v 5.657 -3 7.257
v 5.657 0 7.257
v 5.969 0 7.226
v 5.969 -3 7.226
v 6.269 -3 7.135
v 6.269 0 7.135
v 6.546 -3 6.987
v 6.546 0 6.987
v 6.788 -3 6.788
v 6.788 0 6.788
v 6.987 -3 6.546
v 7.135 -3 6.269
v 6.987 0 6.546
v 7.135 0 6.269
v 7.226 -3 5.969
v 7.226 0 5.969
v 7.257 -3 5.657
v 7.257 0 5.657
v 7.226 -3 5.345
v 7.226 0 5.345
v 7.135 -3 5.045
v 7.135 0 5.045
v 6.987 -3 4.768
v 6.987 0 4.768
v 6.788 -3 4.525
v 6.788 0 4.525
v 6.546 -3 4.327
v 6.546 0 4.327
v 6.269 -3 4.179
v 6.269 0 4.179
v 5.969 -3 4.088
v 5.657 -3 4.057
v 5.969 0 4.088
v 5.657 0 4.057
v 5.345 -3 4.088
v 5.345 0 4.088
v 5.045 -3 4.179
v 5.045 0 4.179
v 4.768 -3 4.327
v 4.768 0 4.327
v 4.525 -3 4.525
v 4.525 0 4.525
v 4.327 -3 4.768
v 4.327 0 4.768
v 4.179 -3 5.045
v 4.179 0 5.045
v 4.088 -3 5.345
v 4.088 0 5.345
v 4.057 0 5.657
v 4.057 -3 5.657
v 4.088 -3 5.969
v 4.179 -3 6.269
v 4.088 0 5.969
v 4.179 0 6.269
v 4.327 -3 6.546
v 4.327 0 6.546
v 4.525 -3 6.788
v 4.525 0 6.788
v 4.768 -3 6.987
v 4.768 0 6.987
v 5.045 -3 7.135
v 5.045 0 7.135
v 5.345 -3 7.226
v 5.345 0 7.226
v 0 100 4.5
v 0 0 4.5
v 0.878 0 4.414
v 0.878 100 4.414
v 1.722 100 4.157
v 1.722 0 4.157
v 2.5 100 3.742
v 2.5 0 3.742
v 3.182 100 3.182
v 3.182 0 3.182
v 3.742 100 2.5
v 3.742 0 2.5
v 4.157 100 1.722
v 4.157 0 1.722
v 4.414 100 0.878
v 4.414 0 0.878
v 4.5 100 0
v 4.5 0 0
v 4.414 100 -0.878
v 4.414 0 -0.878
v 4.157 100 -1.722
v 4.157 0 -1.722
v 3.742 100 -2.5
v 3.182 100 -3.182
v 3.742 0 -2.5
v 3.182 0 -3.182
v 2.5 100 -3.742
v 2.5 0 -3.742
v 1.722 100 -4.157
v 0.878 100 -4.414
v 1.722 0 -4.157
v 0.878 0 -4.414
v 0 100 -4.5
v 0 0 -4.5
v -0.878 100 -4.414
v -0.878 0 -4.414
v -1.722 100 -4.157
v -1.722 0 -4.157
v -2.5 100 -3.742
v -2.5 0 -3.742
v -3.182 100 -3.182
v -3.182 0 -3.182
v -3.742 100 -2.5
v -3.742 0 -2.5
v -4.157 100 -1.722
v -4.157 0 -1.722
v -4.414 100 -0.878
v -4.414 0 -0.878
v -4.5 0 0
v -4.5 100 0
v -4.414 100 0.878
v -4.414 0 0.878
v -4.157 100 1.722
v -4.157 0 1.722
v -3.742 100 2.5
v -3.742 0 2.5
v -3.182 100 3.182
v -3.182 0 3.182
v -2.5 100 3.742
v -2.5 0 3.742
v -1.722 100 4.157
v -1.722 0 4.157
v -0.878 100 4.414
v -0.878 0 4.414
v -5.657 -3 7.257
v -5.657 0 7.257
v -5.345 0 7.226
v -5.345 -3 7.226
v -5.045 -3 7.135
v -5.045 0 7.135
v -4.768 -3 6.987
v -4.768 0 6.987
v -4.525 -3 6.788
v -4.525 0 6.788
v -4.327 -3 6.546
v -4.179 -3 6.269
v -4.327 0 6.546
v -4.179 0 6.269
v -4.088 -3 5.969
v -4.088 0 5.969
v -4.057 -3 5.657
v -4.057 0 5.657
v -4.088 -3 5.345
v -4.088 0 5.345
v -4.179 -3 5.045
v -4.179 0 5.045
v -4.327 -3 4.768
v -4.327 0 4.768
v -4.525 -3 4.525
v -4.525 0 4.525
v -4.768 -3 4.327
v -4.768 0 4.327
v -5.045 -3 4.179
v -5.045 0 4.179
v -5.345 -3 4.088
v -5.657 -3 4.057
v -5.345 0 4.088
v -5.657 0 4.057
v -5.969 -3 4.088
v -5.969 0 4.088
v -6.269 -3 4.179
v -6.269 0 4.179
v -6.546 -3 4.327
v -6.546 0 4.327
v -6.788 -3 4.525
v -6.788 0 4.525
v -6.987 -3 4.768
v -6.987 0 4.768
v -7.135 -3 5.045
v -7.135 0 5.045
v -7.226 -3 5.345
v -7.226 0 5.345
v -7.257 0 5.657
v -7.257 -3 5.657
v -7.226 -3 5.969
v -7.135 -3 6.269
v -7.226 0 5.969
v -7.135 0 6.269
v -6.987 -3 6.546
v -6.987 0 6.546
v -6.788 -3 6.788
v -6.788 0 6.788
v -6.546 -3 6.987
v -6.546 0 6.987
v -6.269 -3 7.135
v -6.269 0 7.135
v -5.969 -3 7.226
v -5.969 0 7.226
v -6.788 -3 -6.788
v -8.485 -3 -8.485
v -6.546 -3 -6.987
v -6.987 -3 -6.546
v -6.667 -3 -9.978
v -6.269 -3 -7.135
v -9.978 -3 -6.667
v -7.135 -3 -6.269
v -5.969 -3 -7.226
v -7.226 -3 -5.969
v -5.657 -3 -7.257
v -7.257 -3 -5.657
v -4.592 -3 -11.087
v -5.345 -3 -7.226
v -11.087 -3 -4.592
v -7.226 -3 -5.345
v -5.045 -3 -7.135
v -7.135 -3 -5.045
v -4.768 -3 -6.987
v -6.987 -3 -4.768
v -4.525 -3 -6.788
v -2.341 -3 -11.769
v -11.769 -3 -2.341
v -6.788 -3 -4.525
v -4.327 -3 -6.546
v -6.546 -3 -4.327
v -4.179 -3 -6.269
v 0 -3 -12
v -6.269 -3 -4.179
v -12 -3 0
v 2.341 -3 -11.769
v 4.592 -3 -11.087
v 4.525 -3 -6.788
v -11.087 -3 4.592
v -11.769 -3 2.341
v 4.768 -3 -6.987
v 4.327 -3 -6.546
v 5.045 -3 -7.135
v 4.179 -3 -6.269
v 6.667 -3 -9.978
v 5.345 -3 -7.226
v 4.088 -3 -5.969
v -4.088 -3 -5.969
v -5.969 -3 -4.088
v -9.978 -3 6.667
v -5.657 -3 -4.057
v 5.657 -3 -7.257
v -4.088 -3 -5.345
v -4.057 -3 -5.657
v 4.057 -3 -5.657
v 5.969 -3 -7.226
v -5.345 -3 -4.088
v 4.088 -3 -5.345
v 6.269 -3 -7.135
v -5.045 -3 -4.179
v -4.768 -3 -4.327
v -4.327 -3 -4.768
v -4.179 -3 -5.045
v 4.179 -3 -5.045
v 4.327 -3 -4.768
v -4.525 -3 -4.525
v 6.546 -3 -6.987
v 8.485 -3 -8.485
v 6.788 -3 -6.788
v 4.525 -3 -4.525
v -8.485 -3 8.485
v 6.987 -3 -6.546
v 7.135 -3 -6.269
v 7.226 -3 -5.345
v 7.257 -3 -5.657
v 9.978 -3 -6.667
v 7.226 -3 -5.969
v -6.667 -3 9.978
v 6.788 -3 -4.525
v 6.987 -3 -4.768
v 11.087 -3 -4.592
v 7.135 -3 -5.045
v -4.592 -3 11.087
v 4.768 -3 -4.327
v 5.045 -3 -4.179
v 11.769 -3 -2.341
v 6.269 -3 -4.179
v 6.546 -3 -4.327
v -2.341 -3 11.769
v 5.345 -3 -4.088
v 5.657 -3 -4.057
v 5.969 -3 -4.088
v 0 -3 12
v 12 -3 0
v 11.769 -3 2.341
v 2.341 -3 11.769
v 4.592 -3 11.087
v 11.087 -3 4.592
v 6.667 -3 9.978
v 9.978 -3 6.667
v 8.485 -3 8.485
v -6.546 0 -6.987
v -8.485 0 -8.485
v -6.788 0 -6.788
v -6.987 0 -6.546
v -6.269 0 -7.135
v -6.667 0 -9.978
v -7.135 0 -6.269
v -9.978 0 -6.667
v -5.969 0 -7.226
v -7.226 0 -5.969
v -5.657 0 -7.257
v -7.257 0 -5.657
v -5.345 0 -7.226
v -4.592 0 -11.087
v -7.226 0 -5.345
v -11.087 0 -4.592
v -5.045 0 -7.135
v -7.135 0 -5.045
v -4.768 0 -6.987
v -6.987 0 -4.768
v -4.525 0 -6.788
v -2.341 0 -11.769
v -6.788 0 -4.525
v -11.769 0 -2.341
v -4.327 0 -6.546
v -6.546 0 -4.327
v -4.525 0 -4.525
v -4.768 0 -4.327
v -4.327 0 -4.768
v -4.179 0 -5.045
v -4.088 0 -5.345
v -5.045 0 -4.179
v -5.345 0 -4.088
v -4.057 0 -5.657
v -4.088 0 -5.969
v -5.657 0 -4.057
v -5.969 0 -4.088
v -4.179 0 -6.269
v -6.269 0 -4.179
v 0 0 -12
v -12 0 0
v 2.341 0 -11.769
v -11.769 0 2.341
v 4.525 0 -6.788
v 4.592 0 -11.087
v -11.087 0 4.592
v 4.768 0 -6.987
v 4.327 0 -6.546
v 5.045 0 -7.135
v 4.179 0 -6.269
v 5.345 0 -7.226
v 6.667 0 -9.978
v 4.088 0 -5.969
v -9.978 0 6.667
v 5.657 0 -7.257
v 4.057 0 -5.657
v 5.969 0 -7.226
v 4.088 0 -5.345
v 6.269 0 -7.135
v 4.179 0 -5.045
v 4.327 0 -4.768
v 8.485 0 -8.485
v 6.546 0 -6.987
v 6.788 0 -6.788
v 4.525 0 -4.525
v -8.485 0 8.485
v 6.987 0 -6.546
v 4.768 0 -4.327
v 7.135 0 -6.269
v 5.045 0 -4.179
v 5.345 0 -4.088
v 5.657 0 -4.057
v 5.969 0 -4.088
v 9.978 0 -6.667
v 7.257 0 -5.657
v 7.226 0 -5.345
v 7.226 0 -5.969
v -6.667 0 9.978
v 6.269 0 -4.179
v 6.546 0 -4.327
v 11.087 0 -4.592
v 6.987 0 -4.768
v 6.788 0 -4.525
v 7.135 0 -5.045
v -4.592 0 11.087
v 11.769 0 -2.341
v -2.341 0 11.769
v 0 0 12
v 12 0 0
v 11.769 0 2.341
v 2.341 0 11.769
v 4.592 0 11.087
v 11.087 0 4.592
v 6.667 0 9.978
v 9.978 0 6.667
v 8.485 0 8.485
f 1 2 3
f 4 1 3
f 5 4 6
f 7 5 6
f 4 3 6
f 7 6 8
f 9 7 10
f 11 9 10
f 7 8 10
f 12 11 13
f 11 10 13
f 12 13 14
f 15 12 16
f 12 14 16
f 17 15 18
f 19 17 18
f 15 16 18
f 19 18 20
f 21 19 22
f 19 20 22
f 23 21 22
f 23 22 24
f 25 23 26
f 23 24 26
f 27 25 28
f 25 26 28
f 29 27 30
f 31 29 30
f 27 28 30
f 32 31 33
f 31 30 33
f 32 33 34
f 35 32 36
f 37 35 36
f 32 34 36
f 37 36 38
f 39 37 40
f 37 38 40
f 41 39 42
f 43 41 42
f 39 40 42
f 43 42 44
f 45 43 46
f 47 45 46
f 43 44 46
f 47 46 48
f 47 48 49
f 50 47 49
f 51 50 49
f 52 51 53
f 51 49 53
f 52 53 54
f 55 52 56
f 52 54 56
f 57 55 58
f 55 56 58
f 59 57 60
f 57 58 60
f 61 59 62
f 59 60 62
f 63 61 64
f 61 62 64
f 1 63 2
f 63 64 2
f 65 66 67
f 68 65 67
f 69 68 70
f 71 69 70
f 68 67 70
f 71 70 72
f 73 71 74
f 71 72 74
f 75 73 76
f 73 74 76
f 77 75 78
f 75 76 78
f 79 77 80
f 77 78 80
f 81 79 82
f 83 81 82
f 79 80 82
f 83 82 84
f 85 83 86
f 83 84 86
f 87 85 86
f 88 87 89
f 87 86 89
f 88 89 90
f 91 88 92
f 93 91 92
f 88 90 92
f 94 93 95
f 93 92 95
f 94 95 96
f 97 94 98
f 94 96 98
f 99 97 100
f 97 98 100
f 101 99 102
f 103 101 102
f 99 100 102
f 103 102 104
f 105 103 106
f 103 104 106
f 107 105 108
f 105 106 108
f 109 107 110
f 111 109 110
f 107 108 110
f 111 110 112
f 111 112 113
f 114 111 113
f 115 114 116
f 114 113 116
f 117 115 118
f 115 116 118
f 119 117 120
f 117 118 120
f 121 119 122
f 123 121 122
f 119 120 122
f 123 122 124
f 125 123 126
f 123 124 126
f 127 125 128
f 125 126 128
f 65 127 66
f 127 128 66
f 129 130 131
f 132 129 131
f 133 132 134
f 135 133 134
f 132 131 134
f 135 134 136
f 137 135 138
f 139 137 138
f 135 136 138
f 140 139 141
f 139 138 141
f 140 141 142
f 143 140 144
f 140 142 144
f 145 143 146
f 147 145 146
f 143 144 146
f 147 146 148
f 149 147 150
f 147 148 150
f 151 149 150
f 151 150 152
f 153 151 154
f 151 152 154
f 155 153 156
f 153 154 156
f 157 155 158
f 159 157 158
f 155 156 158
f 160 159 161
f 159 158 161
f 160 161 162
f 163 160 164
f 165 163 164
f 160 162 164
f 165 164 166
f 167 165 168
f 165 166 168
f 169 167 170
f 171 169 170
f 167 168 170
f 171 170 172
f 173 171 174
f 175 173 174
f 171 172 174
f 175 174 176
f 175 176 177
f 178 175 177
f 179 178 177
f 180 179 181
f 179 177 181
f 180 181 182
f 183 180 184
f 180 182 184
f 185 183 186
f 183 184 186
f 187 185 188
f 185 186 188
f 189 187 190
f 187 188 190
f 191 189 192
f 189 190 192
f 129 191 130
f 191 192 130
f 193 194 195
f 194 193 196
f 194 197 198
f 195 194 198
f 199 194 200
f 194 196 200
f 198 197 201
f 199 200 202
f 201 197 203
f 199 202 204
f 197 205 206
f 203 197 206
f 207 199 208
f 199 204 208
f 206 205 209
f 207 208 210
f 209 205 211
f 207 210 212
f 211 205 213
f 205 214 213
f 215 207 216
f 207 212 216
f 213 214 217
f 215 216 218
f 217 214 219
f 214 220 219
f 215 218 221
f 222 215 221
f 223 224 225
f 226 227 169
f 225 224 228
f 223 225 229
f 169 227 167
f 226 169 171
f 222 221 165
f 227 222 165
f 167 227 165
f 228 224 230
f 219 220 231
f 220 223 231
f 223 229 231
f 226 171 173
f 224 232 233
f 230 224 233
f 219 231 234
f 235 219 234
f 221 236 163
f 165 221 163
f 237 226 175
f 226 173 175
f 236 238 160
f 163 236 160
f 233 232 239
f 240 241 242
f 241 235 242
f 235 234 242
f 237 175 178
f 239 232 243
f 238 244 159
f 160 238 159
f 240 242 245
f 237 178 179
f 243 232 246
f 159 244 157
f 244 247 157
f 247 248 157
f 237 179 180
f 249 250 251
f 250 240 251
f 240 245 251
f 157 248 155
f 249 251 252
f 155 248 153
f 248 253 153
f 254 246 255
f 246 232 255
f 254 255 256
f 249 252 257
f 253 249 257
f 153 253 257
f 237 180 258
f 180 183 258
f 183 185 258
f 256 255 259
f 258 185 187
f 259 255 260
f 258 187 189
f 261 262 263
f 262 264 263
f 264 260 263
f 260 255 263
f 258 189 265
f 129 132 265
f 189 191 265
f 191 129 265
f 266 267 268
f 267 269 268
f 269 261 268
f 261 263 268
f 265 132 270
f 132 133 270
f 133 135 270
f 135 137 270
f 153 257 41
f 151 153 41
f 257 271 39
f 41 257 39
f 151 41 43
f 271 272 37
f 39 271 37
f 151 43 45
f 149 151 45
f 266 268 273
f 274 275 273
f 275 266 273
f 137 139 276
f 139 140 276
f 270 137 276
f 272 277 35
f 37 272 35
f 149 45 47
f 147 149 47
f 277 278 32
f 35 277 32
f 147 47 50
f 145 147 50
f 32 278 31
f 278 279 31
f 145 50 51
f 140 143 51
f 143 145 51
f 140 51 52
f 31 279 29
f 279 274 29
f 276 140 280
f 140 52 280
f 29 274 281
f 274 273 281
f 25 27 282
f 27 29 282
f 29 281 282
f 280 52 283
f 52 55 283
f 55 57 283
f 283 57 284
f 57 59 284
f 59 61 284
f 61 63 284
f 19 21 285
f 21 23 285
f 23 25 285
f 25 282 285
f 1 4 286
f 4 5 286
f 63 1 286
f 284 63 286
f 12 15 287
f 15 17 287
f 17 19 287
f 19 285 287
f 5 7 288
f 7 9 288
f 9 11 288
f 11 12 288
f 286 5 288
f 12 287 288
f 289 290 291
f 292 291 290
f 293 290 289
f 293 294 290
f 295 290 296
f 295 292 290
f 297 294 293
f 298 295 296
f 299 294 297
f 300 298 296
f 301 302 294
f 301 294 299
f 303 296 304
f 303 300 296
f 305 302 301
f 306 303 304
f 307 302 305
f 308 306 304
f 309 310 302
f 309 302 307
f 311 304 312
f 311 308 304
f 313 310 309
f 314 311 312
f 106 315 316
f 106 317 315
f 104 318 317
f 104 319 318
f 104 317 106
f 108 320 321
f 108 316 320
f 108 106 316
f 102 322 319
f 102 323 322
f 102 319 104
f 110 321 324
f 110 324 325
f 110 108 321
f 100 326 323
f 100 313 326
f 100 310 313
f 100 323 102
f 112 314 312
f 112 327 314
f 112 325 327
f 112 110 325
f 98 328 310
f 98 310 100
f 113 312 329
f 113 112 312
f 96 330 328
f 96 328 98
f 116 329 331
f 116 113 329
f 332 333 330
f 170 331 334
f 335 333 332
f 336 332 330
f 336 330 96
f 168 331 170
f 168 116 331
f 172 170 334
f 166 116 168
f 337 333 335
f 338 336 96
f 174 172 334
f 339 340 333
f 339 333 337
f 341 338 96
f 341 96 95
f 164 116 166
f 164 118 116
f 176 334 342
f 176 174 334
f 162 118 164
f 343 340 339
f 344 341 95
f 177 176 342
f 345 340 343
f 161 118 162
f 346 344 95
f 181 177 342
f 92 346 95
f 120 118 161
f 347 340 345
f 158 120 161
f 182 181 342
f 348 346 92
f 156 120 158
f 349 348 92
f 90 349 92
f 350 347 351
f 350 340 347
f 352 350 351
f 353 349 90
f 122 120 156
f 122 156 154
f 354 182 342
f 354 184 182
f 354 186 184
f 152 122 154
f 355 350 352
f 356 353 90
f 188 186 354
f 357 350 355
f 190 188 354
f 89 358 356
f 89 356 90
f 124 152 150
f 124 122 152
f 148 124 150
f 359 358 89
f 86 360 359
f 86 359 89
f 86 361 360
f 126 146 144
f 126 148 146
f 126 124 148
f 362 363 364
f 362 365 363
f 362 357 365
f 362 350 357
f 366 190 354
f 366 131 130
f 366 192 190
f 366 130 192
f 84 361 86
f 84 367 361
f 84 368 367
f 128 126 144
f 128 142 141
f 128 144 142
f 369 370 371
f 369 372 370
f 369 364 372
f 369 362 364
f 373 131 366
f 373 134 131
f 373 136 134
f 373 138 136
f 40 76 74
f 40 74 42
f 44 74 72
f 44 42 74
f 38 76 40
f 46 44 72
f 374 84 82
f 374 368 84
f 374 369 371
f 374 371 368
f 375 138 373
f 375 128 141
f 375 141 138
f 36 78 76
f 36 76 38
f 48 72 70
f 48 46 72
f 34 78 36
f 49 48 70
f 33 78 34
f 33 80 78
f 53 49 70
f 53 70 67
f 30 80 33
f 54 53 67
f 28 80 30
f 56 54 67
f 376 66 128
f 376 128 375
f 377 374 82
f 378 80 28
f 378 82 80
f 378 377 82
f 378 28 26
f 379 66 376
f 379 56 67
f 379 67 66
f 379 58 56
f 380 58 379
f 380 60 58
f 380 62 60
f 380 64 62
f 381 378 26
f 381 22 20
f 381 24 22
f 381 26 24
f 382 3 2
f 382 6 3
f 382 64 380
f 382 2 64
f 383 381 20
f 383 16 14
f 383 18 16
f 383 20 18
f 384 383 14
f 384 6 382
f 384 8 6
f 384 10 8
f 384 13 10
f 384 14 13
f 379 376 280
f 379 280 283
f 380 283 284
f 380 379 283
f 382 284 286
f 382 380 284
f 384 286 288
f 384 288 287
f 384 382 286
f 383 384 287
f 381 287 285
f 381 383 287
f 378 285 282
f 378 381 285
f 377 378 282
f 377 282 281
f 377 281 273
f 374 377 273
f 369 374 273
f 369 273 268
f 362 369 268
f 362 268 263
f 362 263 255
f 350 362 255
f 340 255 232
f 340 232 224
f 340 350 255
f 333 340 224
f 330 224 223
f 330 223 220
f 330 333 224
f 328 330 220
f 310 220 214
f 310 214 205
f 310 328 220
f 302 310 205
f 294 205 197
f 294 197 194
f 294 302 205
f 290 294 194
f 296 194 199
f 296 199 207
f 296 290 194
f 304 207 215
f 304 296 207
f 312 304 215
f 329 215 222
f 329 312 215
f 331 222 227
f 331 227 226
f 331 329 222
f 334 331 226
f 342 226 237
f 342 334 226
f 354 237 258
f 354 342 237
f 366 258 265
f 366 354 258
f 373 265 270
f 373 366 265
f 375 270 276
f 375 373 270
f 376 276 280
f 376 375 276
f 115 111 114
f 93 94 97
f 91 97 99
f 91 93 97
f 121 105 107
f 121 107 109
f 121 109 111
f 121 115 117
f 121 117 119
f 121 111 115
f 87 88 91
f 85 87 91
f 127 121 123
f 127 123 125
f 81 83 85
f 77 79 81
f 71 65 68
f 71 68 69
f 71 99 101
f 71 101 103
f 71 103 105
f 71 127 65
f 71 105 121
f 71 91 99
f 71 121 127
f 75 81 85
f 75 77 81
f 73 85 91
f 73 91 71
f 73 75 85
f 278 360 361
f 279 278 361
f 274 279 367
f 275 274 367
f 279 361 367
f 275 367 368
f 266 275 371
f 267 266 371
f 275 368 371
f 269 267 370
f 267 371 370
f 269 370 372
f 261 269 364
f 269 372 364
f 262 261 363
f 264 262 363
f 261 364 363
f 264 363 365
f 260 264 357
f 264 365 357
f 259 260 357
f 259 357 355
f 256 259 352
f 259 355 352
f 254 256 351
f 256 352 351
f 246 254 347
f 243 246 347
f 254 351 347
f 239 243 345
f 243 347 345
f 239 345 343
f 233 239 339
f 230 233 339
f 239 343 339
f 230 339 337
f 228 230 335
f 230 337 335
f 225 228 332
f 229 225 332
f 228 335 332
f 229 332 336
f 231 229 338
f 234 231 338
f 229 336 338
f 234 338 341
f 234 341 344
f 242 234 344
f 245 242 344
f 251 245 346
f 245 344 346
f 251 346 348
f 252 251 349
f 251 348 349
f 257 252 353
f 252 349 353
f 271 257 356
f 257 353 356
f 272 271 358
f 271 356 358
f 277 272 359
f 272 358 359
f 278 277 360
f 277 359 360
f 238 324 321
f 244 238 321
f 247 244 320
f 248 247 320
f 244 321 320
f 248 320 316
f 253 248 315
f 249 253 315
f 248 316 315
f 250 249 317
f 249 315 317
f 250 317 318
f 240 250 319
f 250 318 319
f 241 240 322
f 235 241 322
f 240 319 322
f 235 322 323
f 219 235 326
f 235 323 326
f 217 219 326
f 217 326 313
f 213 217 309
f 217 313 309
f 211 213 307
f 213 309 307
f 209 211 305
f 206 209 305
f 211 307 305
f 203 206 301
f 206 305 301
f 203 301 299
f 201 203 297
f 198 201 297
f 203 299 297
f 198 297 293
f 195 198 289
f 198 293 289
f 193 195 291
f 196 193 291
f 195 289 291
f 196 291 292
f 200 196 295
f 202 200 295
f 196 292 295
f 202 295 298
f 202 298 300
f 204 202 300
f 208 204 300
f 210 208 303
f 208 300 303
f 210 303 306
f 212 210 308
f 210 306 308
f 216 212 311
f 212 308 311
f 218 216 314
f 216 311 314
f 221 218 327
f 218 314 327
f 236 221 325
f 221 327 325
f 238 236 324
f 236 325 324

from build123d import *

# Parameters (mm, degrees)
SKETCH_1_R          = 12
EXTRUDE_2_DEPTH     = 3
SKETCH_2_R          = 1.6
CUT_EXTRUDE_1_DEPTH = 3
SKETCH_3_R          = 4.5
EXTRUDE_3_DEPTH     = 100


with BuildPart() as part:
    # 草图1 → 凸台-拉伸2 (new body)
    with BuildSketch(Plane(origin=(0, 0, 0), x_dir=(1, 0, 0), z_dir=(0, 1, 0))):
        with Locations(Location((0, 0, 0), (0, 0, 270))):
            Circle(SKETCH_1_R)
    extrude(amount=-EXTRUDE_2_DEPTH)

    # 草图2 → 切除-拉伸1 (cut)
    with BuildSketch(Plane(origin=(0, 0, 0), x_dir=(1, 0, 0), z_dir=(0, 1, 0))):
        with Locations(Location((5.656854249, -5.656854249, 0), (0, 0, 270))):
            Circle(SKETCH_2_R)
        with Locations(Location((-5.656854249, -5.656854249, 0), (0, 0, 270))):
            Circle(SKETCH_2_R)
        with Locations(Location((-5.656854249, 5.656854249, 0), (0, 0, 270))):
            Circle(SKETCH_2_R)
        with Locations(Location((5.656854249, 5.656854249, 0), (0, 0, 270))):
            Circle(SKETCH_2_R)
    extrude(amount=-CUT_EXTRUDE_1_DEPTH, mode=Mode.SUBTRACT)

    # 草图3 → 凸台-拉伸3 (add)
    with BuildSketch(Plane(origin=(0, 0, 0), x_dir=(1, 0, 0), z_dir=(0, 1, 0))):
        with Locations(Location((0, 0, 0), (0, 0, 270))):
            Circle(SKETCH_3_R)
    extrude(amount=EXTRUDE_3_DEPTH)


solid = part.part
